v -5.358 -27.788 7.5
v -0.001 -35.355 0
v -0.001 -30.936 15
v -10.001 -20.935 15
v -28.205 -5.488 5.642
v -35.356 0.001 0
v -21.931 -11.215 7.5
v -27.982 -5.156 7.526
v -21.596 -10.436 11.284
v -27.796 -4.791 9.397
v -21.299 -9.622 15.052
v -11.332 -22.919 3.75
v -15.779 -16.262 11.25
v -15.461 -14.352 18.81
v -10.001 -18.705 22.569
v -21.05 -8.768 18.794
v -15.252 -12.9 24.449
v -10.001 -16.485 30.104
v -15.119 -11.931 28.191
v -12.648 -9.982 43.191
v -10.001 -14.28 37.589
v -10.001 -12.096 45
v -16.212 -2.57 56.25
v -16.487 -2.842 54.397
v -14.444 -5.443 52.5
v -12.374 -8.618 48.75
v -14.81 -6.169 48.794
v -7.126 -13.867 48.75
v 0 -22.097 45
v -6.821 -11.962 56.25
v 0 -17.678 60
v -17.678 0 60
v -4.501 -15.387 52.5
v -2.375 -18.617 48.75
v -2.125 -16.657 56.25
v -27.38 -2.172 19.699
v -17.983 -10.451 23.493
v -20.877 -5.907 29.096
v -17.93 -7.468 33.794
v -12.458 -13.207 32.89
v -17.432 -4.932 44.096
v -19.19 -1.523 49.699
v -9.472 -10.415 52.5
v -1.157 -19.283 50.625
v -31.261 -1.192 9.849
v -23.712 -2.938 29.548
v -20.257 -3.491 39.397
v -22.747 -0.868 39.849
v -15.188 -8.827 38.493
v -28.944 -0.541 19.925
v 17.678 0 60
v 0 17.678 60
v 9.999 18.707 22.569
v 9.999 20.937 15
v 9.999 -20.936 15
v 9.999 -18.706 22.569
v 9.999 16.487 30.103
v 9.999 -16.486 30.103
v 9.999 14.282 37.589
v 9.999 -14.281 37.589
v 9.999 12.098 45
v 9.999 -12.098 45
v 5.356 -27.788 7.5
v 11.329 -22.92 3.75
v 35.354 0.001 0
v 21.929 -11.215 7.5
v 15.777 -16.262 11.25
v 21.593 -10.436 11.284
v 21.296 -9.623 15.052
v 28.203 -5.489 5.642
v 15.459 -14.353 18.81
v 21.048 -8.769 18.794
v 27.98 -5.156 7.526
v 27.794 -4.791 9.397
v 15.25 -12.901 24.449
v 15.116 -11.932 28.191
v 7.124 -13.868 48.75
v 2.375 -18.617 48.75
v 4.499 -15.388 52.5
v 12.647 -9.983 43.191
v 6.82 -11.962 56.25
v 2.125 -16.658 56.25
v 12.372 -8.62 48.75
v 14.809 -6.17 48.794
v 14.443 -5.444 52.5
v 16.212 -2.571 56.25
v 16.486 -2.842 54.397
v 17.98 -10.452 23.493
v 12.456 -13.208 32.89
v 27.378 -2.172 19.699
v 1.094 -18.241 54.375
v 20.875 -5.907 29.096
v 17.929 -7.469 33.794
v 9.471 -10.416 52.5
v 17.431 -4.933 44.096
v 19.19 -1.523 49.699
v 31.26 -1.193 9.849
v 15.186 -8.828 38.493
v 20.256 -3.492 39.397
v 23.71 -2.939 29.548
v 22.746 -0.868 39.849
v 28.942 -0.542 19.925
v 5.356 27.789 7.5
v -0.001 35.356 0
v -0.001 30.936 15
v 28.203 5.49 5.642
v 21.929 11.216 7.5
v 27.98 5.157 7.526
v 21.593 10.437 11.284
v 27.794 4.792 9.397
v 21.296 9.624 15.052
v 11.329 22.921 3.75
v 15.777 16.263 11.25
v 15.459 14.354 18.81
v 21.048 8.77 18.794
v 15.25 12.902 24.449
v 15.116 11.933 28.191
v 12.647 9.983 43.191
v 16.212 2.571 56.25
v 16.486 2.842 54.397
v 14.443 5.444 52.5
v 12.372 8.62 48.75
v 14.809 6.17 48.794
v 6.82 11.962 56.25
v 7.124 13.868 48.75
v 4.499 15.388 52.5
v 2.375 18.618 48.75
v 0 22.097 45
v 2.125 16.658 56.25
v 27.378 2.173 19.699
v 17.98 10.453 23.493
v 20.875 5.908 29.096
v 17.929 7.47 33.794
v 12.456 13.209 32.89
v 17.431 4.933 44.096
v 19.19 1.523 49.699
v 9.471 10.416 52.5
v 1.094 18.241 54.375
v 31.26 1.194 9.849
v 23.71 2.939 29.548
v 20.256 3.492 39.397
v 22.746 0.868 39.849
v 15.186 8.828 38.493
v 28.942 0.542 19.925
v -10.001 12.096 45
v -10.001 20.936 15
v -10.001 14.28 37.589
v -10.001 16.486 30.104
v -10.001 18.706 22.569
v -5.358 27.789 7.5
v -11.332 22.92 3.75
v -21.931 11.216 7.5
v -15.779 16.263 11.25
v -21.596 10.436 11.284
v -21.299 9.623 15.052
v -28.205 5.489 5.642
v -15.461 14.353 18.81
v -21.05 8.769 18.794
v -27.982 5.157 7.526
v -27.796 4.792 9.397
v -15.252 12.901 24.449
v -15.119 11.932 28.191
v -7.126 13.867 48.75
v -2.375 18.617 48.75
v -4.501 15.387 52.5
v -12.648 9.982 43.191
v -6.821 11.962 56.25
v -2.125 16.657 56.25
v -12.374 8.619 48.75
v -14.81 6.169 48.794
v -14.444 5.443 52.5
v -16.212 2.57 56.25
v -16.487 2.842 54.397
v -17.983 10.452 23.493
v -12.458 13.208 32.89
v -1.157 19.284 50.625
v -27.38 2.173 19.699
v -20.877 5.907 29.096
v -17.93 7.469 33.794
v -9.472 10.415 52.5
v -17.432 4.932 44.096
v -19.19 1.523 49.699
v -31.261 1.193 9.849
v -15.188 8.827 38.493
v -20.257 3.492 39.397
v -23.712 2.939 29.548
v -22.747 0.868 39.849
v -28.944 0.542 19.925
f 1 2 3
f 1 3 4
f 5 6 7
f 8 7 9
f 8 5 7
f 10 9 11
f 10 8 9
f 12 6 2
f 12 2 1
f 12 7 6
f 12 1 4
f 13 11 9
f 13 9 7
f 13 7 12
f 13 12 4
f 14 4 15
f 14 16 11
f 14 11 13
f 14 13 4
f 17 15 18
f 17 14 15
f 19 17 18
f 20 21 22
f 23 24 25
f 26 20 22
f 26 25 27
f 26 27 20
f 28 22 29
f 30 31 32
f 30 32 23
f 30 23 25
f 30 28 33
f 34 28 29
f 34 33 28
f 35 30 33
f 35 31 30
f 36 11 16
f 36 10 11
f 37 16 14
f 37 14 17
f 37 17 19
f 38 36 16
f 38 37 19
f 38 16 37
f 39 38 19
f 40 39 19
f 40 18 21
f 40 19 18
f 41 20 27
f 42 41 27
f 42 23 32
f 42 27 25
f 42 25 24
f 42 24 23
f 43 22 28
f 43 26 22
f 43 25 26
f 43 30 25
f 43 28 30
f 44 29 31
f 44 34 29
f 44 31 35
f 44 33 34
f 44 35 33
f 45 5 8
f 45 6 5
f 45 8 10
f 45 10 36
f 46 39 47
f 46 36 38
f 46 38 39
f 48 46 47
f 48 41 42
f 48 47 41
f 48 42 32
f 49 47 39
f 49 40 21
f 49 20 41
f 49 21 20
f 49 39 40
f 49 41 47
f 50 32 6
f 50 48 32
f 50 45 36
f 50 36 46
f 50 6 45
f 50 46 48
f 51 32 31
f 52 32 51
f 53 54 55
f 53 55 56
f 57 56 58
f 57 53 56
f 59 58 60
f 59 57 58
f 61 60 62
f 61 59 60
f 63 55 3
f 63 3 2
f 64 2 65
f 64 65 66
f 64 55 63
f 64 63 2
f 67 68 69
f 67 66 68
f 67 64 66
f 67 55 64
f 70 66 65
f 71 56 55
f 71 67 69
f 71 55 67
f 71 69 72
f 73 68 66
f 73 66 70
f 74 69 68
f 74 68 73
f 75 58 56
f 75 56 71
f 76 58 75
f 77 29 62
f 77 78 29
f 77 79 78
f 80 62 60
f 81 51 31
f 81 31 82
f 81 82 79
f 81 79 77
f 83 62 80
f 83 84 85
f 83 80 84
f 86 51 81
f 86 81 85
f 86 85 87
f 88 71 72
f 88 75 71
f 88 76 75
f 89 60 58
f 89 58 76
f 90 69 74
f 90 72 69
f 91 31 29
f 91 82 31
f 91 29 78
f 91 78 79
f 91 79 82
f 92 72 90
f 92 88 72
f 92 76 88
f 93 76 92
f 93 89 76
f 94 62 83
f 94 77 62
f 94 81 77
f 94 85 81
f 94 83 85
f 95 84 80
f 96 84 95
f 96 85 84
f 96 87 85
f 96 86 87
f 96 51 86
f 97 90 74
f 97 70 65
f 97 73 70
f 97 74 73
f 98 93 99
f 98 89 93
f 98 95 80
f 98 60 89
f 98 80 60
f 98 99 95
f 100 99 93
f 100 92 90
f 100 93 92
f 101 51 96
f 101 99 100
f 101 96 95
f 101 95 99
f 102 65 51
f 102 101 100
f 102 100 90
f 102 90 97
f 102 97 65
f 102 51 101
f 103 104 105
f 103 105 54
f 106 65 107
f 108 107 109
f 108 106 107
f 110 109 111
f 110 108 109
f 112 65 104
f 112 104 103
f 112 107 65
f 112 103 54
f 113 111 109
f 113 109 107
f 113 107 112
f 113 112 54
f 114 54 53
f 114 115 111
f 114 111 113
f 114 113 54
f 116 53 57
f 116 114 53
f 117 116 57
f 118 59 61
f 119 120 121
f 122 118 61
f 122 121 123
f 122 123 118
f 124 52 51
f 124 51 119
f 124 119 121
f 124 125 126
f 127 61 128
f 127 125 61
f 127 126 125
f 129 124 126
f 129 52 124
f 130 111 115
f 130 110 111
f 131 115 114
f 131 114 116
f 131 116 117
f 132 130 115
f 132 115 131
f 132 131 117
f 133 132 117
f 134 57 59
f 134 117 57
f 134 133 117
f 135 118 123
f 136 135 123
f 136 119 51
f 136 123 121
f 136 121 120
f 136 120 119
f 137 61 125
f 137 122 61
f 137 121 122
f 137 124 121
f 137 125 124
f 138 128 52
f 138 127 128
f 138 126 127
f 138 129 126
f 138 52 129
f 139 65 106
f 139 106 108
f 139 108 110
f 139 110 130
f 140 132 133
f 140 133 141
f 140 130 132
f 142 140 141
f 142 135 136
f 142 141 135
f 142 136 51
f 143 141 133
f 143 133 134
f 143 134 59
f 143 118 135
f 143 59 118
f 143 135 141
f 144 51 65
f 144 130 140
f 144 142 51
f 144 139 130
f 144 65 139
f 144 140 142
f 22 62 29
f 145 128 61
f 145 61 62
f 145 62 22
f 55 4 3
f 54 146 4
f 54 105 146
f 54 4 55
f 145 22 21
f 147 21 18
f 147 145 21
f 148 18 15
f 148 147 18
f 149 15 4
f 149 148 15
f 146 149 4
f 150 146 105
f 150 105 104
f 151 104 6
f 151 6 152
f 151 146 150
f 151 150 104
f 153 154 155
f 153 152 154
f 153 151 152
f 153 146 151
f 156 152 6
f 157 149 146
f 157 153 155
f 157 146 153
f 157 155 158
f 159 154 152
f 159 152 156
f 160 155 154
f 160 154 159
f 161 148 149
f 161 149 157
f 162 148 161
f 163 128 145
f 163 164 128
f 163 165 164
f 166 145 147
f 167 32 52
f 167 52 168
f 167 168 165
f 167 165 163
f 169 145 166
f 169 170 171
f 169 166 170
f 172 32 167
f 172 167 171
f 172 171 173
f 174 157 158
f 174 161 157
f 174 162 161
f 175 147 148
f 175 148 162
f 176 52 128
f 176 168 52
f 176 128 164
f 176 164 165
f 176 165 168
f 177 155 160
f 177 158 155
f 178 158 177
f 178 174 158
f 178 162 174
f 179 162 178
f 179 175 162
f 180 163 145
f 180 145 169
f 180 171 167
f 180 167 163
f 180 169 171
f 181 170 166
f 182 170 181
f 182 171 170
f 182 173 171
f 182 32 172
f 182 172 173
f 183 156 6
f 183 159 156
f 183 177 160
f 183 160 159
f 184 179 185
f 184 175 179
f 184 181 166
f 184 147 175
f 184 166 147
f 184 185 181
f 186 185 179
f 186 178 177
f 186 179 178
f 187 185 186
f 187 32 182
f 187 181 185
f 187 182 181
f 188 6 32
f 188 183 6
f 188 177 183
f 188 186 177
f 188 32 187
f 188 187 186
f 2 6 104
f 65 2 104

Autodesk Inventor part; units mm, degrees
ref_plane "YZ Plane" through (0, 0, 0) normal (1, 0, 0) x (0, 1, 0)
sketch "Эскиз1" plane through (0, 0, 0) normal (0, 0, 1) x (1, 0, 0)
  line L0 (-35.3564, 0.0006) -> (-0.0011, 35.3559)
  line L1 (-35.3564, 0.0006) -> (-0.0011, -35.3548)
  line L2 (-0.0011, -35.3548) -> (35.3543, 0.0006)
  line L3 (35.3543, 0.0006) -> (-0.0011, 35.3559)
  point P0 (0, 0)
  point P1 (0, 0)
sketch "Эскиз2" plane through (0, 0, 0) normal (0, 0, 1) x (1, 0, 0)
  point P0 (0, 0)
ref_plane "РабПлоскость1" through (0, 0, 60) normal (0, 0, 1) x (1, 0, 0)
sketch "Эскиз3" plane through (0, 0, 60) normal (0, 0, 1) x (1, 0, 0)
  line L0 (-17.6777, 0) -> (0, 17.6777)
  line L1 (0, 17.6777) -> (17.6777, 0)
  line L2 (17.6777, 0) -> (0, -17.6777)
  line L3 (0, -17.6777) -> (-17.6777, 0)
  point P0 (0, 0)
sketch "Эскиз4" plane through (0, 0, 60) normal (0, 0, 1) x (1, 0, 0)
  point P0 (0, 0)
sketch "Эскиз5" plane through (0, 0, 60) normal (0, 0, 1) x (1, 0, 0)
  point P0 (0, 0)
sketch "Эскиз6" plane through (0, 0, 0) normal (0, 0, 1) x (1, 0, 0)
  point P0 (0, 0)
sketch "Эскиз7" plane through (0, 0, 0) normal (0, 0, 1) x (1, 0, 0)
  point P0 (0, 0)
loft "Лофт1" add profiles "Эскиз1", "Эскиз3"
sketch "Эскиз8" plane through (0, 0, 0) normal (0, 1, 0) x (-1, 0, 0)
  point P0 (0, 0)
ref_plane "РабПлоскость2" through (0, 70, 0) normal (0, 1, 0) x (-1, 0, 0)
sketch "Эскиз9" plane through (0, 70, 0) normal (0, 1, 0) x (-1, 0, 0)
  line L0 (-9.9989, 45) -> (10.0011, 45)
  line L1 (10.0011, 45) -> (10.0011, 15)
  line L2 (10.0011, 15) -> (-9.9989, 15)
  line L3 (-9.9989, 15) -> (-9.9989, 45)
  line L4 (0.0011, 0) -> (-35.3543, 0) projected
  point P0 (0, 0)
extrude "Выдавливание1" cut sketch "Эскиз9" against normal blind 110
